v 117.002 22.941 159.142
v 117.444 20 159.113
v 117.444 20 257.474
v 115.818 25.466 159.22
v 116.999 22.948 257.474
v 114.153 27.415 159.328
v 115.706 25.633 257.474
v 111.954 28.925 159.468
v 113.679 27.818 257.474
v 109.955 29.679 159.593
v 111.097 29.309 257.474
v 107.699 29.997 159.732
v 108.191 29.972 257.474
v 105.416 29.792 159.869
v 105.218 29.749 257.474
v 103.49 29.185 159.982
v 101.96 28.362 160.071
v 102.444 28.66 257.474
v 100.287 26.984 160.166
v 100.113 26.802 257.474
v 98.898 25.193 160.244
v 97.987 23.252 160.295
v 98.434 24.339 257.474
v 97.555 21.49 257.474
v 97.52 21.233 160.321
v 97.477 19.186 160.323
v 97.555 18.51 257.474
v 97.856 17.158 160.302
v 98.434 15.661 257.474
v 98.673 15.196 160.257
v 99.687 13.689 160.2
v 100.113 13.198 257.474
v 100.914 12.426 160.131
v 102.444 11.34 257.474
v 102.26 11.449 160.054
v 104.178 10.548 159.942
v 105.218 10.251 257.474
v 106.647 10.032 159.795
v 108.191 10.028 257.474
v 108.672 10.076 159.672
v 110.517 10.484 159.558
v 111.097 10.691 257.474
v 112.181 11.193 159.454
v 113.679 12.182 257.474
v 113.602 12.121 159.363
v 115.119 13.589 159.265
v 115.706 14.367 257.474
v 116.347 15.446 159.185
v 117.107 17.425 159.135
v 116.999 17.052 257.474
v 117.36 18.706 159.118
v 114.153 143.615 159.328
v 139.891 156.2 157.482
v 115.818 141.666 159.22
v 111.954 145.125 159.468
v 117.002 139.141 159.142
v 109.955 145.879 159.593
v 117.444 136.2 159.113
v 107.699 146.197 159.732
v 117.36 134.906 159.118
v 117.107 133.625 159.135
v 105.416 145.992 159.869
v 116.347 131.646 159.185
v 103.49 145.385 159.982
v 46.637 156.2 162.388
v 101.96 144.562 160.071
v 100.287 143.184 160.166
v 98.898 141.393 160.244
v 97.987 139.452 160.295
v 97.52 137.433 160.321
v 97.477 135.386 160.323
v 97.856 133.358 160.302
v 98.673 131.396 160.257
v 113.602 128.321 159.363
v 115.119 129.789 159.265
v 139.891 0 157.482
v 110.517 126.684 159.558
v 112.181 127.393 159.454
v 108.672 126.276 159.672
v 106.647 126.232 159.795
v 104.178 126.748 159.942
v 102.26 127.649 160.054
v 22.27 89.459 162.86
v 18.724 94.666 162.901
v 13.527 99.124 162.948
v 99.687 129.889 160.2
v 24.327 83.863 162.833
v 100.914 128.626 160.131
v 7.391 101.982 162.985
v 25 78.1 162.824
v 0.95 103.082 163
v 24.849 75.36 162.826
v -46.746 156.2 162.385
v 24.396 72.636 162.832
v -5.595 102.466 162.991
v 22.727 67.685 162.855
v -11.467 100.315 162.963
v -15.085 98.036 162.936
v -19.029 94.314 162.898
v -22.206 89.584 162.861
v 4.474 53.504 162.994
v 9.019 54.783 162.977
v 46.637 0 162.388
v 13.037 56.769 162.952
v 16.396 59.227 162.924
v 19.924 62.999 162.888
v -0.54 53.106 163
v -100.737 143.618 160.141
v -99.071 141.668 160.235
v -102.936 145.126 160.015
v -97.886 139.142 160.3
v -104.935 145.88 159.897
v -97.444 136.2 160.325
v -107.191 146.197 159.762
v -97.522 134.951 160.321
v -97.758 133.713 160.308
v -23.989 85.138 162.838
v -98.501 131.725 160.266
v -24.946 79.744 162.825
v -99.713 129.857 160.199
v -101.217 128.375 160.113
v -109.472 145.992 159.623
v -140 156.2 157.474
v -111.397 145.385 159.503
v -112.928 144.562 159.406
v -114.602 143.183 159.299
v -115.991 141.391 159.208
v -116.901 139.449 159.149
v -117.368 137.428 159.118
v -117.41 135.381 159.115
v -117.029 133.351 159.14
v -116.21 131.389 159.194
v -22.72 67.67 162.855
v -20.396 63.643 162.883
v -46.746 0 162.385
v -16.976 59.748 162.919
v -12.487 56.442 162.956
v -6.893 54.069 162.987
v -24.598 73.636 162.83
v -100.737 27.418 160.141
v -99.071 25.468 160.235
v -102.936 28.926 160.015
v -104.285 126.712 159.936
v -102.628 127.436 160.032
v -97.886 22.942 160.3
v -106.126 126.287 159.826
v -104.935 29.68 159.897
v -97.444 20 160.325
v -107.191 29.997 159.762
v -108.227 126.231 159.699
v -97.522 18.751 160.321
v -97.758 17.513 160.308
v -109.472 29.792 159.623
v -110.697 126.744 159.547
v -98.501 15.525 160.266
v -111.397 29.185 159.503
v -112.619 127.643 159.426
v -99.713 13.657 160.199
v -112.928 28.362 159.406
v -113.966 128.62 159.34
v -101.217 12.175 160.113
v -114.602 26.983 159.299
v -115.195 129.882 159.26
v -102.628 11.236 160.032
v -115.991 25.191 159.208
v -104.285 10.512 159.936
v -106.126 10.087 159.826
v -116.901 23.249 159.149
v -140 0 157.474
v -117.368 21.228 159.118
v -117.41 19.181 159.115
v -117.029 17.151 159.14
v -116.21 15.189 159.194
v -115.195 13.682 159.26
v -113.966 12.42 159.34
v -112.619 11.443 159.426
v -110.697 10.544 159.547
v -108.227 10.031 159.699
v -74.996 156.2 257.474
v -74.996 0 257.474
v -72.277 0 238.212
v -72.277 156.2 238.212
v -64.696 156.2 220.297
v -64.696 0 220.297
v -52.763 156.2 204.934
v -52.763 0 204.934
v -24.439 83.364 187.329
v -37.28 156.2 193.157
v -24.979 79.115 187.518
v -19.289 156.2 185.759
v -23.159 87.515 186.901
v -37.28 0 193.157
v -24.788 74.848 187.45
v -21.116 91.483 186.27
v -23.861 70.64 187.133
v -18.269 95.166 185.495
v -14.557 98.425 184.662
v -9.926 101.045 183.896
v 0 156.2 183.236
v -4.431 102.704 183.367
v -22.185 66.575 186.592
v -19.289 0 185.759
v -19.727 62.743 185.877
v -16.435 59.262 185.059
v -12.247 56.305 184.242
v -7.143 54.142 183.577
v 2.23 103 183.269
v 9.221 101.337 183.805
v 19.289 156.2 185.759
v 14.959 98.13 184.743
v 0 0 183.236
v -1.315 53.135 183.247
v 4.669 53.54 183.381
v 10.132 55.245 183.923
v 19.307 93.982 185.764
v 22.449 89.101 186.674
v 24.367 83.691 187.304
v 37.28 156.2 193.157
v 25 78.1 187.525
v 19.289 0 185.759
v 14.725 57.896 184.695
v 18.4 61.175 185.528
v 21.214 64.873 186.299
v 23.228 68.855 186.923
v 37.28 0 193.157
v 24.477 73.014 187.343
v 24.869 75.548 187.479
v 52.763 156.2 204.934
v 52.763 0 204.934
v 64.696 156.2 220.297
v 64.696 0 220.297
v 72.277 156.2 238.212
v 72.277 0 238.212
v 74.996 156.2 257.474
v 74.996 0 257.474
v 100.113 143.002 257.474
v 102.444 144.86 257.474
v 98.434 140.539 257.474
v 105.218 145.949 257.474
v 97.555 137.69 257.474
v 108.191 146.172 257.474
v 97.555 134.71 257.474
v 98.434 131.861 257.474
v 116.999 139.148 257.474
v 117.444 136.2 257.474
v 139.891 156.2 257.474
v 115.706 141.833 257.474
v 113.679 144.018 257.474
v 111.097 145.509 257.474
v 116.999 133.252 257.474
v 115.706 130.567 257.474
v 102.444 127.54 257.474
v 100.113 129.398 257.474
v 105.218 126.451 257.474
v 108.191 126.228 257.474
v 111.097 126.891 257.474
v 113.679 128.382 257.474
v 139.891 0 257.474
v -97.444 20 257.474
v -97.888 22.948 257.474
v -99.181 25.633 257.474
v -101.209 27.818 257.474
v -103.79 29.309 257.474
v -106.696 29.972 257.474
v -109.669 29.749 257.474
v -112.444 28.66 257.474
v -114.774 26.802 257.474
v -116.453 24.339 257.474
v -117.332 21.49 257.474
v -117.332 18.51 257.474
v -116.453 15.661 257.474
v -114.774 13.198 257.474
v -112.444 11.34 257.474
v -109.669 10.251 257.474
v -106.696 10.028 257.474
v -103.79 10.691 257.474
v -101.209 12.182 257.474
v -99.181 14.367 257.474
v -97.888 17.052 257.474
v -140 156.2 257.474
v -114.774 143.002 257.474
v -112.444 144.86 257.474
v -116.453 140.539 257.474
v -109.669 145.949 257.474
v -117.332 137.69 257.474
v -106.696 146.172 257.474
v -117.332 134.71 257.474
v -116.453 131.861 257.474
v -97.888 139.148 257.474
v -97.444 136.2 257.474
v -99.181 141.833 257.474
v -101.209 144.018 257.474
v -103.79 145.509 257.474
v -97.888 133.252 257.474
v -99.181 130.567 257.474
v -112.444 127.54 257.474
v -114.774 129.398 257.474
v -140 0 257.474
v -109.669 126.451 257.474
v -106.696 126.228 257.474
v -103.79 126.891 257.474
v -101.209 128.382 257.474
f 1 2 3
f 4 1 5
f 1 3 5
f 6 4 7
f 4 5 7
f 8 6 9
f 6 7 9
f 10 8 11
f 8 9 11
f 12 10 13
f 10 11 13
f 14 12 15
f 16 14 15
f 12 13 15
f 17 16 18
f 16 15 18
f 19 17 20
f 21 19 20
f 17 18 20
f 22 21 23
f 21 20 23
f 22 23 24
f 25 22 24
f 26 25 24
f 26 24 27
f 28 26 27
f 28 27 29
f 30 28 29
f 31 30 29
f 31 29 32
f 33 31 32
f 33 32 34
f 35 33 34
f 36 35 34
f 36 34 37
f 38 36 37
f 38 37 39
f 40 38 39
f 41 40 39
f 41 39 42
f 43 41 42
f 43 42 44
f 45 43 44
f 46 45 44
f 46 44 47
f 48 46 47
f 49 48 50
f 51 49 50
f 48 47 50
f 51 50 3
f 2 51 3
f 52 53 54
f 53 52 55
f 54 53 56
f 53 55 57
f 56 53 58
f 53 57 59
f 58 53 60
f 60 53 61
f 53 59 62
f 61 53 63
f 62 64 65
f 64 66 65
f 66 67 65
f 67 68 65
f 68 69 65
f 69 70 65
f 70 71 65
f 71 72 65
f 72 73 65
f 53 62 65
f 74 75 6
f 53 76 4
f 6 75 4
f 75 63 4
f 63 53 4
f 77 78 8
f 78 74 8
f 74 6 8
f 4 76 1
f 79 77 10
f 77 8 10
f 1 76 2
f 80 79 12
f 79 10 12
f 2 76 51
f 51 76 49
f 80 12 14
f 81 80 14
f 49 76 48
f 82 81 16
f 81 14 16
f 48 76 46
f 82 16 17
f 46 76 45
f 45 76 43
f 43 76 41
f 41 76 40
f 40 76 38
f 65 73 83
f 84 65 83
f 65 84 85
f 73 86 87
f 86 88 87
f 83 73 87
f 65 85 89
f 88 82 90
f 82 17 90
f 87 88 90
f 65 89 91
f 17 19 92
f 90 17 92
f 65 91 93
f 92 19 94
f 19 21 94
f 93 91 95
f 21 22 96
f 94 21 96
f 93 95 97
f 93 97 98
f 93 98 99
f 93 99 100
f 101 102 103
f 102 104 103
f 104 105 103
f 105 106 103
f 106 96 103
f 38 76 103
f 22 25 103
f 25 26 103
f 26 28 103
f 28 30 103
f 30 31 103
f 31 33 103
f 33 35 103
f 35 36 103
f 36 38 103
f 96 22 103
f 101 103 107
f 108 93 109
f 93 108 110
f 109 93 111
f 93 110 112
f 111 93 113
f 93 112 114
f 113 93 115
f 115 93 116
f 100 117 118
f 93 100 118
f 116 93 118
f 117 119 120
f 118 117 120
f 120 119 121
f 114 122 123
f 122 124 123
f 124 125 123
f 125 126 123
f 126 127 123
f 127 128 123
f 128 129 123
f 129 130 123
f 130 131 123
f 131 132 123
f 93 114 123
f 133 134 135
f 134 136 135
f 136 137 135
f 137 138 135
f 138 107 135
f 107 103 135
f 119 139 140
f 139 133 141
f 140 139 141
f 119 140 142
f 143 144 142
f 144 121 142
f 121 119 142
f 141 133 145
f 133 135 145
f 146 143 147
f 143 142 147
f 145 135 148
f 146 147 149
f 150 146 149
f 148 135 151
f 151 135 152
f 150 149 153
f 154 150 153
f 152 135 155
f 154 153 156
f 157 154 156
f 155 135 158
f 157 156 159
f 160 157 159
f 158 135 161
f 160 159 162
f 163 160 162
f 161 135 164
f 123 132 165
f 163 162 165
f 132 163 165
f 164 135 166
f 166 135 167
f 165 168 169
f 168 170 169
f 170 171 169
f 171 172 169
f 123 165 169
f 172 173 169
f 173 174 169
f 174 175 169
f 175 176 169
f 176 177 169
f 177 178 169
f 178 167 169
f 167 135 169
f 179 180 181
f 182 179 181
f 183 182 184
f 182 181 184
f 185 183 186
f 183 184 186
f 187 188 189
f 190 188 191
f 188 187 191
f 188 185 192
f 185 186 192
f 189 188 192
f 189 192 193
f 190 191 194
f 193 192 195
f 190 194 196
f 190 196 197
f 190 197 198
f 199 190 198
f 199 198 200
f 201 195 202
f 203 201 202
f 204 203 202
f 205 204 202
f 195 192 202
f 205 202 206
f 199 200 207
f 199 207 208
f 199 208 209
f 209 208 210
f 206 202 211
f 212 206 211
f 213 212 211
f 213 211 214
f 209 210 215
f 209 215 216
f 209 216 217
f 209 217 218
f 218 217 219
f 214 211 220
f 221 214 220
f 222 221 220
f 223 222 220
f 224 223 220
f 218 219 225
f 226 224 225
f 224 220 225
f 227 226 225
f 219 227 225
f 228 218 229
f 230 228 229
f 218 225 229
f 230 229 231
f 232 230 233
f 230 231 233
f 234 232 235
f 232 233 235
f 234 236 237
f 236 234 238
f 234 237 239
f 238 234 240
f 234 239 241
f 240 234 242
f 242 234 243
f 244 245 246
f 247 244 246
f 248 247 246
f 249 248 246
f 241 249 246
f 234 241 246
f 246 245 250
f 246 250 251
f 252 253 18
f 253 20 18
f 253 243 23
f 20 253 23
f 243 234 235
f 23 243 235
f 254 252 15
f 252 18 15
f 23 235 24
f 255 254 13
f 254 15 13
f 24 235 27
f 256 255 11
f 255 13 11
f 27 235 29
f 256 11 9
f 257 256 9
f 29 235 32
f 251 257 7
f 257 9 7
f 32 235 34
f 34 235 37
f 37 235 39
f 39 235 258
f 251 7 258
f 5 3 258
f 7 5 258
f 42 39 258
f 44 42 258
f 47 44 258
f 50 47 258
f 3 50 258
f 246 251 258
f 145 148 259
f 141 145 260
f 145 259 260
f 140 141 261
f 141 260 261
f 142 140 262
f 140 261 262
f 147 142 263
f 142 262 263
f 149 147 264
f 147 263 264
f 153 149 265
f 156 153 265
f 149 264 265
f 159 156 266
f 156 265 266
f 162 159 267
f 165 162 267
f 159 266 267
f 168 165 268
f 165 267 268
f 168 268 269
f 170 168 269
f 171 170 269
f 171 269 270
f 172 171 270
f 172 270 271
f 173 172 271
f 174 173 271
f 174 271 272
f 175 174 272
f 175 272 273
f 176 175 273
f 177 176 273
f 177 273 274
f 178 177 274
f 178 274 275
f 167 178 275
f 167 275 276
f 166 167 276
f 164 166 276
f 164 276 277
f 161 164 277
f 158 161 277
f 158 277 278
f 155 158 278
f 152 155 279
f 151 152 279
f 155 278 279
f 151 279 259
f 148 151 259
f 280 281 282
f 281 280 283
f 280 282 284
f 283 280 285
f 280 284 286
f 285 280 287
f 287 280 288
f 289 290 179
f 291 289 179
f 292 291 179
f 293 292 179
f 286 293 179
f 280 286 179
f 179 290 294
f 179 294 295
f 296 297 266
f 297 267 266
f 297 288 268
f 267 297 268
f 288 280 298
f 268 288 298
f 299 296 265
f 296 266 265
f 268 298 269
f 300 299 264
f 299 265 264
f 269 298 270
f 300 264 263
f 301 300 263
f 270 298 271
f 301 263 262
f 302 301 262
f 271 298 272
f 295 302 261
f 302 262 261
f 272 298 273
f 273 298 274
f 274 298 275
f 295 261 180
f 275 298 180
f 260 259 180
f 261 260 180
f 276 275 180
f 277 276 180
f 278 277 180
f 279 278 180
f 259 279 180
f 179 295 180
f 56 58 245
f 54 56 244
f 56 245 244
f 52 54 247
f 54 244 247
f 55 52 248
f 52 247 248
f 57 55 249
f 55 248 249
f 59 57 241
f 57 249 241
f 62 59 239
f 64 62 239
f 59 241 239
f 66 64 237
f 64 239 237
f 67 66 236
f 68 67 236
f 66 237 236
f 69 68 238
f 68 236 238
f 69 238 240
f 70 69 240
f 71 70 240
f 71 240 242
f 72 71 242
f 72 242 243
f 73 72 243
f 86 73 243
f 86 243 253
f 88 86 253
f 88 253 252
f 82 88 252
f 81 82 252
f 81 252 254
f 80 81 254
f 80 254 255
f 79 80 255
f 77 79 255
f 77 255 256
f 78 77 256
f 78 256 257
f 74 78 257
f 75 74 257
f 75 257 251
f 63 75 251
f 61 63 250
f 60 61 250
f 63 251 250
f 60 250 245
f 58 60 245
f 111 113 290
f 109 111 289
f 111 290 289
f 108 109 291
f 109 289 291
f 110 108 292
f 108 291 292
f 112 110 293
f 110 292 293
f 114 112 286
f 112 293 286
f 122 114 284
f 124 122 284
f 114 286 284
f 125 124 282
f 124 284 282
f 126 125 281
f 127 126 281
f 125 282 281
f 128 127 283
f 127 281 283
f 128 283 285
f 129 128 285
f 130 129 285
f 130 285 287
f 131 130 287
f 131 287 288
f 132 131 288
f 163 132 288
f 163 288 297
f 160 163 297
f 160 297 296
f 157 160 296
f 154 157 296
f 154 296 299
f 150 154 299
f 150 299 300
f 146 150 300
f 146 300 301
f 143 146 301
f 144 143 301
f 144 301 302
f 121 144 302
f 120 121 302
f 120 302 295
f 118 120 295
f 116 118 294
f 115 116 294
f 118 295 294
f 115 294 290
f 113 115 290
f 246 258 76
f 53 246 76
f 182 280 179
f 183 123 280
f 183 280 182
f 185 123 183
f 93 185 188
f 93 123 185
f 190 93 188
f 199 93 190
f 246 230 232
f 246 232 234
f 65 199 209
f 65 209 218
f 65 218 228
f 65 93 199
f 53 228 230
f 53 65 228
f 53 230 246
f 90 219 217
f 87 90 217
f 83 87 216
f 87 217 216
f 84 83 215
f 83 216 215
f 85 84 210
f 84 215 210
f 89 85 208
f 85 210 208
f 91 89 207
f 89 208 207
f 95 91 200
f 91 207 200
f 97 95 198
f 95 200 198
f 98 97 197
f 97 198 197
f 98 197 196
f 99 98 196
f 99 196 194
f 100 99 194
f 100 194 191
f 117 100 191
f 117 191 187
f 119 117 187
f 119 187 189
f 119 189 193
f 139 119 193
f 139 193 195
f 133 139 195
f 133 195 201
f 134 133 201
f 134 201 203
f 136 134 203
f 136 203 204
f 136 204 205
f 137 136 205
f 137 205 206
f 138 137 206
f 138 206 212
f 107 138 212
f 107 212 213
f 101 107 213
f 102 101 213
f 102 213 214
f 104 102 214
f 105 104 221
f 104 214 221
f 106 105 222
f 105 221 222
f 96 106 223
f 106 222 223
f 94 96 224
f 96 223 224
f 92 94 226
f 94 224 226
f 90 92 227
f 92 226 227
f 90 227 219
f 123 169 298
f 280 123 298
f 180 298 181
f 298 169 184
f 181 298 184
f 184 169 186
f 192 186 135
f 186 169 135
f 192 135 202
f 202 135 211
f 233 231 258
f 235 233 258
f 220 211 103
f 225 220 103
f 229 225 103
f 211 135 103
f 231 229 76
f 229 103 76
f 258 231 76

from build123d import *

# Parameters (mm, degrees)
BOSS_EXTRUDE1_DEPTH = 156.2
SKETCH5_R           = 10
CUT_EXTRUDE1_DEPTH  = 101
SKETCH6_R           = 25
CUT_EXTRUDE2_DEPTH  = 101.0000001


with BuildPart() as part:
    # Sketch1 → Boss-Extrude1 (new body)
    with BuildSketch(Plane(origin=(0, 0, 0), x_dir=(1, 0, 0), z_dir=(0, 1, 0))):
        with BuildLine():
            ThreePointArc((139.891219134, -157.482137257), (-0.054560073, -162.999999162), (-140, -157.473539028))
            Line((-140, -157.473539028), (-140, -257.473539028))
            Line((-140, -257.473539028), (-74.996125665, -257.473539028))
            ThreePointArc((-74.996125665, -257.473539028), (0, -183.235861256), (74.996125665, -257.473539028))
            Line((74.996125665, -257.473539028), (139.891219134, -257.473539028))
            Line((139.891219134, -257.473539028), (139.891219134, -157.482137257))
        make_face()
    extrude(amount=BOSS_EXTRUDE1_DEPTH)

    # Sketch5 → Cut-Extrude1 (cut, through all)
    with BuildSketch(Plane.XY.offset(257.473539028)):
        with Locations((107.4436724, 136.2)):
            Circle(SKETCH5_R)
        with Locations((107.4436724, 20)):
            Circle(SKETCH5_R)
        with Locations((-107.4436724, 20)):
            Circle(SKETCH5_R)
        with Locations((-107.4436724, 136.2)):
            Circle(SKETCH5_R)
    extrude(amount=-CUT_EXTRUDE1_DEPTH, mode=Mode.SUBTRACT)

    # Sketch6 → Cut-Extrude2 (cut, through all)
    with BuildSketch(Plane.XY.offset(257.473539028)):
        with Locations((0, 78.1)):
            Circle(SKETCH6_R)
    extrude(amount=-CUT_EXTRUDE2_DEPTH, mode=Mode.SUBTRACT)


solid = part.part
